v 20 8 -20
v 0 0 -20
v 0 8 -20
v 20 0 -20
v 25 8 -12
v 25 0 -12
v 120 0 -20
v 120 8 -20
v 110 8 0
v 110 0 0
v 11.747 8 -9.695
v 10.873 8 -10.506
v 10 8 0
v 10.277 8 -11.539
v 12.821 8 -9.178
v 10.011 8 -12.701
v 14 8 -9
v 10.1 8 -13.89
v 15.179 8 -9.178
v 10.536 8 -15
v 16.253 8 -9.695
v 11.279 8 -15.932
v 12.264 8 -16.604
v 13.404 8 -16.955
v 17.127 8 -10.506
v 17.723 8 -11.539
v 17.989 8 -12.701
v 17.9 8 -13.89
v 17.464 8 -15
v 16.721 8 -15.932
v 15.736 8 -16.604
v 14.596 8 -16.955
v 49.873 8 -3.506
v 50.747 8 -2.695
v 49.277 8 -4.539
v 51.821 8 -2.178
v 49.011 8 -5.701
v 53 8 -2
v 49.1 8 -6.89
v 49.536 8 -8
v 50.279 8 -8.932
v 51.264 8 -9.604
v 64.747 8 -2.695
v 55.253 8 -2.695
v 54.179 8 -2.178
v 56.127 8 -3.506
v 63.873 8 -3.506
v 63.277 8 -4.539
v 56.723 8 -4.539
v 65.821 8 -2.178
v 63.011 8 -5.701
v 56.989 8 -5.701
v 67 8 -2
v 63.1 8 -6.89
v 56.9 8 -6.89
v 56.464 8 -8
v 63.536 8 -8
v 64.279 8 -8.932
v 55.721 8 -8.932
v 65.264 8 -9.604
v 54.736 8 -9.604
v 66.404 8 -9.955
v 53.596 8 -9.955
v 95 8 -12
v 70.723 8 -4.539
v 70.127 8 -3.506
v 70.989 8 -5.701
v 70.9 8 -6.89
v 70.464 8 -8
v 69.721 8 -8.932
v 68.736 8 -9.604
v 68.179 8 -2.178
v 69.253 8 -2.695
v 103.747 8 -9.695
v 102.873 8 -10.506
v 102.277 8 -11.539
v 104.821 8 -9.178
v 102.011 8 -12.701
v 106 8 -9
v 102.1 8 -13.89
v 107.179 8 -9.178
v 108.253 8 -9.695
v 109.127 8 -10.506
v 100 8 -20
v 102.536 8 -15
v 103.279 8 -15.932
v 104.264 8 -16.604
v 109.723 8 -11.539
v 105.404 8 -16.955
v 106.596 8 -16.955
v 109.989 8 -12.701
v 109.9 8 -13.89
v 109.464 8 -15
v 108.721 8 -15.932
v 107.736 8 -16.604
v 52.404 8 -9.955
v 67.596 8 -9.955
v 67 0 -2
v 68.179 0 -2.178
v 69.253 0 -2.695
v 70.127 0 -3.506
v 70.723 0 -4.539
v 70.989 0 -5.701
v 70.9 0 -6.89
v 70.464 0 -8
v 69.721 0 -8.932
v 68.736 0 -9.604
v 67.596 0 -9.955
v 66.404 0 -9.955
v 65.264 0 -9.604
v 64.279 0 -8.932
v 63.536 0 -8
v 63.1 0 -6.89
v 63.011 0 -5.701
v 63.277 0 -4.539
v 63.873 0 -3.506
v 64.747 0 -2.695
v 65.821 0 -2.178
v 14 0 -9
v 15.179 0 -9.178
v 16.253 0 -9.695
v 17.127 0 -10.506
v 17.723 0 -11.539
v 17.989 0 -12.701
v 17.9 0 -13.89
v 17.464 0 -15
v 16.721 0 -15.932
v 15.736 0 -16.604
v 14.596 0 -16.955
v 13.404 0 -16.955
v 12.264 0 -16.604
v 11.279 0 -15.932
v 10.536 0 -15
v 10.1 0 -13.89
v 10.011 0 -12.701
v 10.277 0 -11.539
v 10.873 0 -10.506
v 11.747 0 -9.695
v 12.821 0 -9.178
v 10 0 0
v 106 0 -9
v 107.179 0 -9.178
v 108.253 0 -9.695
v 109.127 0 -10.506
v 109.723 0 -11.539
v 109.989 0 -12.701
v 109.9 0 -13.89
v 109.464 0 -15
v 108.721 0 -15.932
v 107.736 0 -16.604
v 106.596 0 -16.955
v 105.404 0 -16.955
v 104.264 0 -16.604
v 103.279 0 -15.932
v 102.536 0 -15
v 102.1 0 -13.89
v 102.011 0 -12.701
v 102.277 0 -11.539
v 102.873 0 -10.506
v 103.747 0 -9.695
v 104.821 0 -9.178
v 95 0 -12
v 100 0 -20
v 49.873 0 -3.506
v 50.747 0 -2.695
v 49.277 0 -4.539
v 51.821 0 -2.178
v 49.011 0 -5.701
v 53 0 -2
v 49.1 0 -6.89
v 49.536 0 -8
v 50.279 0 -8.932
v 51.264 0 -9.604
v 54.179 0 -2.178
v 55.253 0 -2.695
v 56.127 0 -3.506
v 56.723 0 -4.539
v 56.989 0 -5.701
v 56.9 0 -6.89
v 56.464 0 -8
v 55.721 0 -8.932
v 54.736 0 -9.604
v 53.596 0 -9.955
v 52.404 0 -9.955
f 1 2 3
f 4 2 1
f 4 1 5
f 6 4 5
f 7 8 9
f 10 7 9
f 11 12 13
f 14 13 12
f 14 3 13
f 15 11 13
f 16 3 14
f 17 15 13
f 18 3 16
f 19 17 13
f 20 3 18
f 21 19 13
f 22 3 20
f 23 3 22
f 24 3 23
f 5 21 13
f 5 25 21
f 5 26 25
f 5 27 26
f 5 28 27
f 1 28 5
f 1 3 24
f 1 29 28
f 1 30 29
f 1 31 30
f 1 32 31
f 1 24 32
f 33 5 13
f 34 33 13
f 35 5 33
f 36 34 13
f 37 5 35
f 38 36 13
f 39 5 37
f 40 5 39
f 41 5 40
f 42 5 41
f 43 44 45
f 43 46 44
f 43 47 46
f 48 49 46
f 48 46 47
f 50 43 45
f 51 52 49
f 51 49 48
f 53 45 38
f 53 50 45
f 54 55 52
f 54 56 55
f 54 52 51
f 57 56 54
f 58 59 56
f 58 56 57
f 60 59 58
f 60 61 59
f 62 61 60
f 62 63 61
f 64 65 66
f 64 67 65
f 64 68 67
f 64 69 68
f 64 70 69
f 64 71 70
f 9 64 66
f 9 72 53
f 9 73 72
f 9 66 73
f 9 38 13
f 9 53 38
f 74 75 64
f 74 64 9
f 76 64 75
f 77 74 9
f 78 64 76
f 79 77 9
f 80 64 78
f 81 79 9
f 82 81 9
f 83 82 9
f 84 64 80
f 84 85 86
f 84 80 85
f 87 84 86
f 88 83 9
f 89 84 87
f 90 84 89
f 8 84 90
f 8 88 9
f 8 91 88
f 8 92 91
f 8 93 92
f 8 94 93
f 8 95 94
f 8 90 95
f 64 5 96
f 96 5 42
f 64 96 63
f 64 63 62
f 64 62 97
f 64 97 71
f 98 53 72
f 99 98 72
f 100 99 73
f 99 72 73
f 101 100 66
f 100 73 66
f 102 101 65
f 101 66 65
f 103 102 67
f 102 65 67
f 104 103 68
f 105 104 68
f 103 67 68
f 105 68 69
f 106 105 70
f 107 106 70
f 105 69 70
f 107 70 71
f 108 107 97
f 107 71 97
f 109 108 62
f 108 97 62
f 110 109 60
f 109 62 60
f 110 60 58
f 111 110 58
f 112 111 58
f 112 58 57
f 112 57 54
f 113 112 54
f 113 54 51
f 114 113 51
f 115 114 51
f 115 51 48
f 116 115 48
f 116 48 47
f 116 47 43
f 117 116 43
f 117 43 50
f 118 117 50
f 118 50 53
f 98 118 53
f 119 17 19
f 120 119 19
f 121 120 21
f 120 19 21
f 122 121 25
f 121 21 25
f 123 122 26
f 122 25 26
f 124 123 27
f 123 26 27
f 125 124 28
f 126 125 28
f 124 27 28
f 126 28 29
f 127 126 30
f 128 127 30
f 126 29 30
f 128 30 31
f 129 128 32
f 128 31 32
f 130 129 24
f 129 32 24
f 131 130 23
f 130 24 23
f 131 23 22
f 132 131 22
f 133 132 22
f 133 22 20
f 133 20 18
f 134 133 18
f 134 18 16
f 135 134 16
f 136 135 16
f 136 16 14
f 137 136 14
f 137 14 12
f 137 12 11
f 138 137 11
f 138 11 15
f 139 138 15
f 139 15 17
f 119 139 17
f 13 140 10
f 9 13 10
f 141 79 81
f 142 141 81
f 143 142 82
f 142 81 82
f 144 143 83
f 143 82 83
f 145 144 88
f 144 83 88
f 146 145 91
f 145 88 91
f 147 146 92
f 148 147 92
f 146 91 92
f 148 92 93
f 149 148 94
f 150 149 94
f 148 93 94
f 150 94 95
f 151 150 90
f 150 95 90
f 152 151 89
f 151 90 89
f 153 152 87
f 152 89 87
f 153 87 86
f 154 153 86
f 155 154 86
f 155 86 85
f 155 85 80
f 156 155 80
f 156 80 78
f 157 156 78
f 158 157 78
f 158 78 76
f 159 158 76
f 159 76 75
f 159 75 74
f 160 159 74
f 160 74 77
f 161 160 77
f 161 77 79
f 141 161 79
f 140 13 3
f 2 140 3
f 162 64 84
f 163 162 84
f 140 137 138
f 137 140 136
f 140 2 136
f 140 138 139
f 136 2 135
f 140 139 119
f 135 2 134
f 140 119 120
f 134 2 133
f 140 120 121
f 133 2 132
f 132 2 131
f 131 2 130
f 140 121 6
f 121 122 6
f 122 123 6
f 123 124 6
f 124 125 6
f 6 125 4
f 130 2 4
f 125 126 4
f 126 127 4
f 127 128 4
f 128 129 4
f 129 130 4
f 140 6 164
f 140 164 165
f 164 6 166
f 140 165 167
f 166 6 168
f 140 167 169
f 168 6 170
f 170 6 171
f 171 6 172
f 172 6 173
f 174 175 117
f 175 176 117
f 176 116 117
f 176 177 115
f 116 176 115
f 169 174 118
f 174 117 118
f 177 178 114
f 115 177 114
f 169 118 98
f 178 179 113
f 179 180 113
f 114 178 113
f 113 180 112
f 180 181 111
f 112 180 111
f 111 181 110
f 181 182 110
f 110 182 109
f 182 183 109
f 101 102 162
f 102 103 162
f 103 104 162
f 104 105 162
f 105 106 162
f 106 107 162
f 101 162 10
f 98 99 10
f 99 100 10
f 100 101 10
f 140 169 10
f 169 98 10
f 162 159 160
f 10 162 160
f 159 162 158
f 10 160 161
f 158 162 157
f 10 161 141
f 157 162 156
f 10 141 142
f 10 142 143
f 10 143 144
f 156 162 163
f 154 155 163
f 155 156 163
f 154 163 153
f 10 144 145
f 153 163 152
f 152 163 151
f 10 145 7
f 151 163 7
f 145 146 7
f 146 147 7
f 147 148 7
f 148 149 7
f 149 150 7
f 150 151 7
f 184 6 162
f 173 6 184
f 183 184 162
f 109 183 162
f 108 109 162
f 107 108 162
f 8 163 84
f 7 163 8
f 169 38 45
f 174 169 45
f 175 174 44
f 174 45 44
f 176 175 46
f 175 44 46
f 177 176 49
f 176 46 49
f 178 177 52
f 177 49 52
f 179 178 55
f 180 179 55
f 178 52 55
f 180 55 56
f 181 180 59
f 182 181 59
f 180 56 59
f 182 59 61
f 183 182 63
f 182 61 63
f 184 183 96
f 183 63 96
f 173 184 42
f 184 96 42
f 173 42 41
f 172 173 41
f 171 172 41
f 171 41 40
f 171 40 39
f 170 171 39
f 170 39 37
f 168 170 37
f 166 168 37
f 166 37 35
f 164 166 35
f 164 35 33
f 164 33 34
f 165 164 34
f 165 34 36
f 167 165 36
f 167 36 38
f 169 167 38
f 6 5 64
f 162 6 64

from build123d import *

# Parameters (mm, degrees)
SKETCH2_W           = 120
SKETCH2_H           = 20
BOSS_EXTRUDE1_DEPTH = 8
CUT_EXTRUDE1_DEPTH  = 40
SKETCH4_R           = 4
CUT_EXTRUDE2_DEPTH  = 10


with BuildPart() as part:
    # Sketch2 → Boss-Extrude1 (new body)
    with BuildSketch(Plane(origin=(0, 0, 0), x_dir=(1, 0, 0), z_dir=(0, 1, 0))):
        with Locations((60, 10)):
            Rectangle(SKETCH2_W, SKETCH2_H)
    extrude(amount=BOSS_EXTRUDE1_DEPTH)

    # Sketch3 → Cut-Extrude1 (cut)
    with BuildSketch(Plane(origin=(0, 8, 0), x_dir=(1, 0, 0), z_dir=(0, 1, 0))):
        Polygon((10, 0), (0, 20), (0, 0), align=None)
        Polygon((120, 0), (120, 20), (110, 0), align=None)
        Polygon((60, 12), (60, 20), (20, 20), (25, 12), align=None)
        Polygon((100, 20), (60, 20), (60, 12), (95, 12), align=None)
    extrude(amount=-CUT_EXTRUDE1_DEPTH, mode=Mode.SUBTRACT)

    # Sketch4 → Cut-Extrude2 (cut)
    with BuildSketch(Plane(origin=(0, 8, 0), x_dir=(1, 0, 0), z_dir=(0, 1, 0))):
        with Locations(Location((14, 13, 0), (0, 0, 270))):
            Circle(SKETCH4_R)
        with Locations(Location((53, 6, 0), (0, 0, 270))):
            Circle(SKETCH4_R)
        with Locations(Location((67, 6, 0), (0, 0, 270))):
            Circle(SKETCH4_R)
        with Locations(Location((106, 13, 0), (0, 0, 270))):
            Circle(SKETCH4_R)
    extrude(amount=-CUT_EXTRUDE2_DEPTH, mode=Mode.SUBTRACT)


solid = part.part
